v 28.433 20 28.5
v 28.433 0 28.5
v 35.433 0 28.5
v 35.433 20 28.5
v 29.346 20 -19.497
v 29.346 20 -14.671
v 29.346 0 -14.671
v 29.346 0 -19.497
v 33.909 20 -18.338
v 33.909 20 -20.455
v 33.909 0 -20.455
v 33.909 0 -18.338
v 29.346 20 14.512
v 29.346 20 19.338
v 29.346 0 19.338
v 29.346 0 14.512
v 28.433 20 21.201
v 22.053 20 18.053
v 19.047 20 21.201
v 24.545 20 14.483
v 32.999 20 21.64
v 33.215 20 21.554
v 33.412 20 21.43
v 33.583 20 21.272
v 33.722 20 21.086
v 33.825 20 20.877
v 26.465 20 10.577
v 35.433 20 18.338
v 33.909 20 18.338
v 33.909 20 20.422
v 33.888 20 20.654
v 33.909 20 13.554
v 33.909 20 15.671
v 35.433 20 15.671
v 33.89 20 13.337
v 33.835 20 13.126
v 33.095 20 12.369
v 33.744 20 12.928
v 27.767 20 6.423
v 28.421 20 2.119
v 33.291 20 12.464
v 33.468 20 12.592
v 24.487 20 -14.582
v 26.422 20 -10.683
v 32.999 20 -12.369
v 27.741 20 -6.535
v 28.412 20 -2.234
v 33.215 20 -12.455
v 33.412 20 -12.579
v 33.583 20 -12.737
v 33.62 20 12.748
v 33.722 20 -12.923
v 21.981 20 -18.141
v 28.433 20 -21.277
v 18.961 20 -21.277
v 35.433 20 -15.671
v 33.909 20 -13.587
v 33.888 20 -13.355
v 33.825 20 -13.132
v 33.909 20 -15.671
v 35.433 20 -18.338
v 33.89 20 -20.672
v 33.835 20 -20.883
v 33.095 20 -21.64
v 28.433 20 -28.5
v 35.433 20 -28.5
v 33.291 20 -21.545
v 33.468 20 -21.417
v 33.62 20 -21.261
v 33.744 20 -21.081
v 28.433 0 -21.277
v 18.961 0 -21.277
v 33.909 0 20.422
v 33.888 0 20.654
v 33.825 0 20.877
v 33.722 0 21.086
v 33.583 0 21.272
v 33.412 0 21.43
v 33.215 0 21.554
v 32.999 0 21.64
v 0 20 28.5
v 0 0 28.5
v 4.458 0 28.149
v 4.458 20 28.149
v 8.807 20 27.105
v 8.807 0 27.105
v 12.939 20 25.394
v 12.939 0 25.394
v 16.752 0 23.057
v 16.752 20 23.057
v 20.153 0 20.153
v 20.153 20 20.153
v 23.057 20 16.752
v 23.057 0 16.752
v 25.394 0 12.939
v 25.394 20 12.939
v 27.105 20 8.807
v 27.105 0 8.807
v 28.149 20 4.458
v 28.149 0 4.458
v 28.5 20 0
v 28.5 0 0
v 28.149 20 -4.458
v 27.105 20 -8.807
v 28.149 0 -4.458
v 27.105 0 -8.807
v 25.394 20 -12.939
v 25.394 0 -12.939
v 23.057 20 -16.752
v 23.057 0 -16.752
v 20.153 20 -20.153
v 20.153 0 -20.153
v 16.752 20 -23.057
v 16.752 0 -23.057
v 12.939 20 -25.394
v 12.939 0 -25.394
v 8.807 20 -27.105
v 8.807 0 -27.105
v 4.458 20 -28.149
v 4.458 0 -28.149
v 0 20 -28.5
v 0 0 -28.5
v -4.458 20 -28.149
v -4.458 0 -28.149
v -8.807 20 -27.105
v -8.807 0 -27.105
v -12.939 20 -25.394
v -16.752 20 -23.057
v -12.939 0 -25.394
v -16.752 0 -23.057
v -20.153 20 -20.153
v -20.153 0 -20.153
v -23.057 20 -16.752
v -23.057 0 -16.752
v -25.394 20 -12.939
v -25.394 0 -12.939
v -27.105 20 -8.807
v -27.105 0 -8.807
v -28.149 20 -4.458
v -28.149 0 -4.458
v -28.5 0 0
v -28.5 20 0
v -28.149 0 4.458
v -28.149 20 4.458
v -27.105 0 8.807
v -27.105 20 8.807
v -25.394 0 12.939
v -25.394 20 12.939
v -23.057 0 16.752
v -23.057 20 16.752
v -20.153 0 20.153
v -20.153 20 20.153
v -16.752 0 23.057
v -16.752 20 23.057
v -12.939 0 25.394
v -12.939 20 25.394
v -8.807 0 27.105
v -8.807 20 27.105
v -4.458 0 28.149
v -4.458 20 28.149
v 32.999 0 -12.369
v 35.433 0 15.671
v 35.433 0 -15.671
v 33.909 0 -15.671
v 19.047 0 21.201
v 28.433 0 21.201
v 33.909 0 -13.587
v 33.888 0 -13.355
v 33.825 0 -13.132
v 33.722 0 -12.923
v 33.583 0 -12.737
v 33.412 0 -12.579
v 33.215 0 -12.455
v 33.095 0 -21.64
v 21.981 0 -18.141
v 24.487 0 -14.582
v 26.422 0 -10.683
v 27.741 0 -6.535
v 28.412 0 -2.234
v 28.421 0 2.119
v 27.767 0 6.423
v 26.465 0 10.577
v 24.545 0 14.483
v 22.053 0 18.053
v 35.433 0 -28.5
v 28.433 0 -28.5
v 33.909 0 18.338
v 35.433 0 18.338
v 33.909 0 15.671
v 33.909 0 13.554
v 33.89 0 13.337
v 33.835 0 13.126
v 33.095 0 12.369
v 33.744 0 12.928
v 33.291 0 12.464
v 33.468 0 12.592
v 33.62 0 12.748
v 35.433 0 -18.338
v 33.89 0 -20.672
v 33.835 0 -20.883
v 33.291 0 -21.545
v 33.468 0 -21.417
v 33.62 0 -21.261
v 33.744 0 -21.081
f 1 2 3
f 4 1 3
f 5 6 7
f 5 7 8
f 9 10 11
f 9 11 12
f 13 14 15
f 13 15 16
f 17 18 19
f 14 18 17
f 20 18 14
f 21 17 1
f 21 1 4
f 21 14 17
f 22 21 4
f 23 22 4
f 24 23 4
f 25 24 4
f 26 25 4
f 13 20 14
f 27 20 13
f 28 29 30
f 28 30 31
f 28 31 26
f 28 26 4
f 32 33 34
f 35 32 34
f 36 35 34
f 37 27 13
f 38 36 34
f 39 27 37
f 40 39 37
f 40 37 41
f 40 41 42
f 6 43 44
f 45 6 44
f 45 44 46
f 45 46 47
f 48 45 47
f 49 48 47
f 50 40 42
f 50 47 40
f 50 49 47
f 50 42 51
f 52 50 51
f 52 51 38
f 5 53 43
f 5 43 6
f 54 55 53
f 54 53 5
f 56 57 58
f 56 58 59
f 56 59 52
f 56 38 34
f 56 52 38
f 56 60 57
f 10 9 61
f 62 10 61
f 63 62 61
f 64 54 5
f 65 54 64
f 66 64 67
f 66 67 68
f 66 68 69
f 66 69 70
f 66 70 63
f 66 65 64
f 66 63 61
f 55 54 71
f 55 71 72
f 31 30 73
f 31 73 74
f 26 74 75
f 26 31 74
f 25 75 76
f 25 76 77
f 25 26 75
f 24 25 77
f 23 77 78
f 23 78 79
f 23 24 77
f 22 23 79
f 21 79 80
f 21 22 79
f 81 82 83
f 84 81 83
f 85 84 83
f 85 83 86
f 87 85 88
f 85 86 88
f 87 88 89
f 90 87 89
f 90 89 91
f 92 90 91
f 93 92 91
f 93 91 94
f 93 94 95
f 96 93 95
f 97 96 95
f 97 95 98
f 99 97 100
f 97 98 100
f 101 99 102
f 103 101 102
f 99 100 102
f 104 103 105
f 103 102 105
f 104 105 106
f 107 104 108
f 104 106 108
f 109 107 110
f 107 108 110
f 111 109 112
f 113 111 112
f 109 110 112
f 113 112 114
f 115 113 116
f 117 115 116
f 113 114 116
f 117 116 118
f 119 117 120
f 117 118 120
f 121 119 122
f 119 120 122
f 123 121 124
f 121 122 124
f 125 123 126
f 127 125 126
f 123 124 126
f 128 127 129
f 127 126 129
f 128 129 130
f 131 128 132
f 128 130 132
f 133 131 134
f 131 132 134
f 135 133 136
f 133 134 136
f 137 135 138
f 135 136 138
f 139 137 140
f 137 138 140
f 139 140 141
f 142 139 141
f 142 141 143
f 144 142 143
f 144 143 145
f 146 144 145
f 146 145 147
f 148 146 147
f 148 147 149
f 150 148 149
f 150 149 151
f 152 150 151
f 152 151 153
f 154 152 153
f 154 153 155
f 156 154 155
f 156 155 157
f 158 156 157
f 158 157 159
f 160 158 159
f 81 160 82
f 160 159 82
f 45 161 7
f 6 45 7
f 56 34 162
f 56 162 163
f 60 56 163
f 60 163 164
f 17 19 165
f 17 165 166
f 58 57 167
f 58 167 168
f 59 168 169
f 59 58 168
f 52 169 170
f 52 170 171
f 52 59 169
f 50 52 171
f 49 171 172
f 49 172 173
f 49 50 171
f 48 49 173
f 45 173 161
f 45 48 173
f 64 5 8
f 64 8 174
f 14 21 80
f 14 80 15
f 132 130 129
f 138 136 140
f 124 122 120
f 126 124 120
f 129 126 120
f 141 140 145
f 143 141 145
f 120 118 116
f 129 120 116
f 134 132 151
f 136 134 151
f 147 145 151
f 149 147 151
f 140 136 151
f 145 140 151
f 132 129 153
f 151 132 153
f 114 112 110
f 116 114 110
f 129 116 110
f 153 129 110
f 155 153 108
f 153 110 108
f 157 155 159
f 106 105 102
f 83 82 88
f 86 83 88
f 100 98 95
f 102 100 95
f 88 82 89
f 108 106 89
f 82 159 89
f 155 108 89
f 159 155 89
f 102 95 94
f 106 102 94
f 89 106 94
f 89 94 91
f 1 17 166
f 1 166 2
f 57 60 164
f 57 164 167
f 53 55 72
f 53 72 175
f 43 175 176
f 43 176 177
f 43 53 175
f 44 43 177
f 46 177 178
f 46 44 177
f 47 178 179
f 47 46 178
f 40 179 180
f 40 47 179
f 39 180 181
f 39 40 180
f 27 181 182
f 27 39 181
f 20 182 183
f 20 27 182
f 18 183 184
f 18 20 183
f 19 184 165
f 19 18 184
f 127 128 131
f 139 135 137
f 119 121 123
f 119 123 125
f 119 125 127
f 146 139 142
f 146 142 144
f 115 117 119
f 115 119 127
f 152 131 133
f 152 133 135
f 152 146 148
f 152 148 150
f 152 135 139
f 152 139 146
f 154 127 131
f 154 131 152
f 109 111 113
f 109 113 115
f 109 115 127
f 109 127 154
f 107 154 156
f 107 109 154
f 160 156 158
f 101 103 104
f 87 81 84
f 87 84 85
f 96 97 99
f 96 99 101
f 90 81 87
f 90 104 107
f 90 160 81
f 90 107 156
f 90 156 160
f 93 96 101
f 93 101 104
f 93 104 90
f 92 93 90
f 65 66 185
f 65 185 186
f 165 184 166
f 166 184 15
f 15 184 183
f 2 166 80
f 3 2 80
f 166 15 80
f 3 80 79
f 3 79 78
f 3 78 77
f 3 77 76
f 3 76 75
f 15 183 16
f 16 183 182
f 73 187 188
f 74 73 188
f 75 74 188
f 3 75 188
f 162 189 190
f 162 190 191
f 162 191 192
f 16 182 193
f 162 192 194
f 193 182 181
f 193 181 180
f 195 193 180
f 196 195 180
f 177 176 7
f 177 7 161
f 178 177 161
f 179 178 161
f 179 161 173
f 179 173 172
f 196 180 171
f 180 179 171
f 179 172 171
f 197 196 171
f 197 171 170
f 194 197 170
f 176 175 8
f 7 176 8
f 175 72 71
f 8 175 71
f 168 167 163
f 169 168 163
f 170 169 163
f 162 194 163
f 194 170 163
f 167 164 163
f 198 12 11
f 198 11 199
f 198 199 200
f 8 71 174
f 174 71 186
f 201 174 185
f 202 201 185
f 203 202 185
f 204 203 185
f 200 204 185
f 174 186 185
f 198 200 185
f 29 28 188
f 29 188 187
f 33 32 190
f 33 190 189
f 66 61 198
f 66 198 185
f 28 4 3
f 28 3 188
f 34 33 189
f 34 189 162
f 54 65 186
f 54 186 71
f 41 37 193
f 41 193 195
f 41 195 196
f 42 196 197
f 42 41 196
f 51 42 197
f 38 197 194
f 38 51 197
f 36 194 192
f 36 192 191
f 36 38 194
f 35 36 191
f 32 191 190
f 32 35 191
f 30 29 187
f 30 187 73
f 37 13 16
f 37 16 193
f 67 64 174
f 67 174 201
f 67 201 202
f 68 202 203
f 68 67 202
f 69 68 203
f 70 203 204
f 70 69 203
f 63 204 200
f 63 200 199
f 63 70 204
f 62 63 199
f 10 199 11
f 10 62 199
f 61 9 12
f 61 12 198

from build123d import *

# Parameters (mm, degrees)
SKETCH1_R               = 28.5
BOSS_EXTRUDE1_DEPTH     = 20
BOSS_EXTRUDE3_DEPTH     = 20
CUT_EXTRUDE1_DEPTH      = 50.676564409
CUT_EXTRUDE1_DEPTH_BACK = 50.676564409
CUT_EXTRUDE2_DEPTH      = 50.676564409
CUT_EXTRUDE2_DEPTH_BACK = 50.676564409
FILLET1_R               = 1.27


with BuildPart() as part:
    # Sketch1 → Boss-Extrude1 (new body)
    with BuildSketch(Plane(origin=(0, 0, 0), x_dir=(1, 0, 0), z_dir=(0, 1, 0))):
        with Locations(Location((0, 0, 0), (0, 0, 270))):
            Circle(SKETCH1_R)
    extrude(amount=BOSS_EXTRUDE1_DEPTH)


with BuildPart() as body_2:
    # Sketch2 → Boss-Extrude3 (new body)
    with BuildSketch(Plane(origin=(0, 20, 0), x_dir=(1, 0, 0), z_dir=(0, 1, 0))):
        with BuildLine():
            Line((35.433191382, 28.5), (28.433191382, 28.5))
            Line((28.433191382, 28.5), (28.433191382, 21.277058423))
            Line((28.433191382, 21.277058423), (18.961455241, 21.277058423))
            ThreePointArc((18.961455241, 21.277058423), (28.499942219, 0.057389264), (19.046990751, -21.200522242))
            Line((19.046990751, -21.200522242), (28.433191382, -21.200522242))
            Line((28.433191382, -21.200522242), (28.433191382, -28.5))
            Line((28.433191382, -28.5), (35.433191382, -28.5))
            Line((35.433191382, -28.5), (35.433191382, 28.5))
        make_face()
    extrude(amount=-BOSS_EXTRUDE3_DEPTH)

    # Sketch6 → Cut-Extrude1 (cut, two sides: drawn at the far end of the back side and taken through both)
    with BuildSketch(Plane.XZ.offset(-CUT_EXTRUDE1_DEPTH_BACK)):
        Polygon((35.433191382, 18.338), (33.909191382, 18.338), (33.909191382, 21.64), (32.998977436, 21.64), (29.346059083, 19.337542289), (29.346059083, 14.511542289), (33.095010475, 12.369), (33.909191382, 12.369), (33.909191382, 15.671), (35.433191382, 15.671), align=None)
    extrude(amount=CUT_EXTRUDE1_DEPTH + CUT_EXTRUDE1_DEPTH_BACK, mode=Mode.SUBTRACT)

    # Sketch8 → Cut-Extrude2 (cut, two sides: drawn at the far end of the back side and taken through both)
    with BuildSketch(Plane.XZ.offset(-CUT_EXTRUDE2_DEPTH_BACK)):
        Polygon((35.433191382, -15.671), (33.909191382, -15.671), (33.909191382, -12.369), (32.998977436, -12.369), (29.346059083, -14.671457711), (29.346059083, -19.497457711), (33.095010475, -21.64), (33.909191382, -21.64), (33.909191382, -18.338), (35.433191382, -18.338), align=None)
    extrude(amount=CUT_EXTRUDE2_DEPTH + CUT_EXTRUDE2_DEPTH_BACK, mode=Mode.SUBTRACT)

    # Fillet1
    # the kernel refuses this fillet: 1.27 mm, written as the material it adds along each edge
    with BuildSketch(Plane(origin=(33.909191382, 20, -21.64), x_dir=(0, 0, 1), z_dir=(0, -1, 0)), Plane(origin=(33.909191382, 20, 12.369), x_dir=(0, 0, 1), z_dir=(0, -1, 0))) as fillet1_piece_1:
        with BuildLine():
            CenterArc((1.185381354, 1.27), FILLET1_R, 201.033434492, 68.966565508)
            Line((0, 0.814180907), (-0.023707627, 0.805064525))
            ThreePointArc((-0.023707627, 0.805064525), (-0.0254, 0.407090453), (-0.0254, 0))
            Line((-0.0254, 0), (0, -0.0254))
            Line((0, -0.0254), (1.185381354, -0.0254))
            Line((1.185381354, -0.0254), (1.185381354, 0))
        make_face()
    extrude(amount=20)
    with BuildSketch(Plane(origin=(33.909191382, 20, -12.369), x_dir=(-1, 0, 0), z_dir=(0, -1, 0)), Plane(origin=(33.909191382, 20, 21.64), x_dir=(-1, 0, 0), z_dir=(0, -1, 0))) as fillet1_piece_2:
        with BuildLine():
            CenterArc((1.27, 1.217971262), FILLET1_R, 180, 73.542974509)
            Line((0, 1.217971262), (-0.0254, 1.217971262))
            Line((-0.0254, 1.217971262), (-0.0254, 0))
            Line((-0.0254, 0), (0, -0.0254))
            ThreePointArc((0, -0.0254), (0.455106973, -0.0254), (0.903018225, -0.024359425))
            Line((0.903018225, -0.024359425), (0.910213946, 0))
        make_face()
    extrude(amount=20)


solid = Compound([part.part, body_2.part])
